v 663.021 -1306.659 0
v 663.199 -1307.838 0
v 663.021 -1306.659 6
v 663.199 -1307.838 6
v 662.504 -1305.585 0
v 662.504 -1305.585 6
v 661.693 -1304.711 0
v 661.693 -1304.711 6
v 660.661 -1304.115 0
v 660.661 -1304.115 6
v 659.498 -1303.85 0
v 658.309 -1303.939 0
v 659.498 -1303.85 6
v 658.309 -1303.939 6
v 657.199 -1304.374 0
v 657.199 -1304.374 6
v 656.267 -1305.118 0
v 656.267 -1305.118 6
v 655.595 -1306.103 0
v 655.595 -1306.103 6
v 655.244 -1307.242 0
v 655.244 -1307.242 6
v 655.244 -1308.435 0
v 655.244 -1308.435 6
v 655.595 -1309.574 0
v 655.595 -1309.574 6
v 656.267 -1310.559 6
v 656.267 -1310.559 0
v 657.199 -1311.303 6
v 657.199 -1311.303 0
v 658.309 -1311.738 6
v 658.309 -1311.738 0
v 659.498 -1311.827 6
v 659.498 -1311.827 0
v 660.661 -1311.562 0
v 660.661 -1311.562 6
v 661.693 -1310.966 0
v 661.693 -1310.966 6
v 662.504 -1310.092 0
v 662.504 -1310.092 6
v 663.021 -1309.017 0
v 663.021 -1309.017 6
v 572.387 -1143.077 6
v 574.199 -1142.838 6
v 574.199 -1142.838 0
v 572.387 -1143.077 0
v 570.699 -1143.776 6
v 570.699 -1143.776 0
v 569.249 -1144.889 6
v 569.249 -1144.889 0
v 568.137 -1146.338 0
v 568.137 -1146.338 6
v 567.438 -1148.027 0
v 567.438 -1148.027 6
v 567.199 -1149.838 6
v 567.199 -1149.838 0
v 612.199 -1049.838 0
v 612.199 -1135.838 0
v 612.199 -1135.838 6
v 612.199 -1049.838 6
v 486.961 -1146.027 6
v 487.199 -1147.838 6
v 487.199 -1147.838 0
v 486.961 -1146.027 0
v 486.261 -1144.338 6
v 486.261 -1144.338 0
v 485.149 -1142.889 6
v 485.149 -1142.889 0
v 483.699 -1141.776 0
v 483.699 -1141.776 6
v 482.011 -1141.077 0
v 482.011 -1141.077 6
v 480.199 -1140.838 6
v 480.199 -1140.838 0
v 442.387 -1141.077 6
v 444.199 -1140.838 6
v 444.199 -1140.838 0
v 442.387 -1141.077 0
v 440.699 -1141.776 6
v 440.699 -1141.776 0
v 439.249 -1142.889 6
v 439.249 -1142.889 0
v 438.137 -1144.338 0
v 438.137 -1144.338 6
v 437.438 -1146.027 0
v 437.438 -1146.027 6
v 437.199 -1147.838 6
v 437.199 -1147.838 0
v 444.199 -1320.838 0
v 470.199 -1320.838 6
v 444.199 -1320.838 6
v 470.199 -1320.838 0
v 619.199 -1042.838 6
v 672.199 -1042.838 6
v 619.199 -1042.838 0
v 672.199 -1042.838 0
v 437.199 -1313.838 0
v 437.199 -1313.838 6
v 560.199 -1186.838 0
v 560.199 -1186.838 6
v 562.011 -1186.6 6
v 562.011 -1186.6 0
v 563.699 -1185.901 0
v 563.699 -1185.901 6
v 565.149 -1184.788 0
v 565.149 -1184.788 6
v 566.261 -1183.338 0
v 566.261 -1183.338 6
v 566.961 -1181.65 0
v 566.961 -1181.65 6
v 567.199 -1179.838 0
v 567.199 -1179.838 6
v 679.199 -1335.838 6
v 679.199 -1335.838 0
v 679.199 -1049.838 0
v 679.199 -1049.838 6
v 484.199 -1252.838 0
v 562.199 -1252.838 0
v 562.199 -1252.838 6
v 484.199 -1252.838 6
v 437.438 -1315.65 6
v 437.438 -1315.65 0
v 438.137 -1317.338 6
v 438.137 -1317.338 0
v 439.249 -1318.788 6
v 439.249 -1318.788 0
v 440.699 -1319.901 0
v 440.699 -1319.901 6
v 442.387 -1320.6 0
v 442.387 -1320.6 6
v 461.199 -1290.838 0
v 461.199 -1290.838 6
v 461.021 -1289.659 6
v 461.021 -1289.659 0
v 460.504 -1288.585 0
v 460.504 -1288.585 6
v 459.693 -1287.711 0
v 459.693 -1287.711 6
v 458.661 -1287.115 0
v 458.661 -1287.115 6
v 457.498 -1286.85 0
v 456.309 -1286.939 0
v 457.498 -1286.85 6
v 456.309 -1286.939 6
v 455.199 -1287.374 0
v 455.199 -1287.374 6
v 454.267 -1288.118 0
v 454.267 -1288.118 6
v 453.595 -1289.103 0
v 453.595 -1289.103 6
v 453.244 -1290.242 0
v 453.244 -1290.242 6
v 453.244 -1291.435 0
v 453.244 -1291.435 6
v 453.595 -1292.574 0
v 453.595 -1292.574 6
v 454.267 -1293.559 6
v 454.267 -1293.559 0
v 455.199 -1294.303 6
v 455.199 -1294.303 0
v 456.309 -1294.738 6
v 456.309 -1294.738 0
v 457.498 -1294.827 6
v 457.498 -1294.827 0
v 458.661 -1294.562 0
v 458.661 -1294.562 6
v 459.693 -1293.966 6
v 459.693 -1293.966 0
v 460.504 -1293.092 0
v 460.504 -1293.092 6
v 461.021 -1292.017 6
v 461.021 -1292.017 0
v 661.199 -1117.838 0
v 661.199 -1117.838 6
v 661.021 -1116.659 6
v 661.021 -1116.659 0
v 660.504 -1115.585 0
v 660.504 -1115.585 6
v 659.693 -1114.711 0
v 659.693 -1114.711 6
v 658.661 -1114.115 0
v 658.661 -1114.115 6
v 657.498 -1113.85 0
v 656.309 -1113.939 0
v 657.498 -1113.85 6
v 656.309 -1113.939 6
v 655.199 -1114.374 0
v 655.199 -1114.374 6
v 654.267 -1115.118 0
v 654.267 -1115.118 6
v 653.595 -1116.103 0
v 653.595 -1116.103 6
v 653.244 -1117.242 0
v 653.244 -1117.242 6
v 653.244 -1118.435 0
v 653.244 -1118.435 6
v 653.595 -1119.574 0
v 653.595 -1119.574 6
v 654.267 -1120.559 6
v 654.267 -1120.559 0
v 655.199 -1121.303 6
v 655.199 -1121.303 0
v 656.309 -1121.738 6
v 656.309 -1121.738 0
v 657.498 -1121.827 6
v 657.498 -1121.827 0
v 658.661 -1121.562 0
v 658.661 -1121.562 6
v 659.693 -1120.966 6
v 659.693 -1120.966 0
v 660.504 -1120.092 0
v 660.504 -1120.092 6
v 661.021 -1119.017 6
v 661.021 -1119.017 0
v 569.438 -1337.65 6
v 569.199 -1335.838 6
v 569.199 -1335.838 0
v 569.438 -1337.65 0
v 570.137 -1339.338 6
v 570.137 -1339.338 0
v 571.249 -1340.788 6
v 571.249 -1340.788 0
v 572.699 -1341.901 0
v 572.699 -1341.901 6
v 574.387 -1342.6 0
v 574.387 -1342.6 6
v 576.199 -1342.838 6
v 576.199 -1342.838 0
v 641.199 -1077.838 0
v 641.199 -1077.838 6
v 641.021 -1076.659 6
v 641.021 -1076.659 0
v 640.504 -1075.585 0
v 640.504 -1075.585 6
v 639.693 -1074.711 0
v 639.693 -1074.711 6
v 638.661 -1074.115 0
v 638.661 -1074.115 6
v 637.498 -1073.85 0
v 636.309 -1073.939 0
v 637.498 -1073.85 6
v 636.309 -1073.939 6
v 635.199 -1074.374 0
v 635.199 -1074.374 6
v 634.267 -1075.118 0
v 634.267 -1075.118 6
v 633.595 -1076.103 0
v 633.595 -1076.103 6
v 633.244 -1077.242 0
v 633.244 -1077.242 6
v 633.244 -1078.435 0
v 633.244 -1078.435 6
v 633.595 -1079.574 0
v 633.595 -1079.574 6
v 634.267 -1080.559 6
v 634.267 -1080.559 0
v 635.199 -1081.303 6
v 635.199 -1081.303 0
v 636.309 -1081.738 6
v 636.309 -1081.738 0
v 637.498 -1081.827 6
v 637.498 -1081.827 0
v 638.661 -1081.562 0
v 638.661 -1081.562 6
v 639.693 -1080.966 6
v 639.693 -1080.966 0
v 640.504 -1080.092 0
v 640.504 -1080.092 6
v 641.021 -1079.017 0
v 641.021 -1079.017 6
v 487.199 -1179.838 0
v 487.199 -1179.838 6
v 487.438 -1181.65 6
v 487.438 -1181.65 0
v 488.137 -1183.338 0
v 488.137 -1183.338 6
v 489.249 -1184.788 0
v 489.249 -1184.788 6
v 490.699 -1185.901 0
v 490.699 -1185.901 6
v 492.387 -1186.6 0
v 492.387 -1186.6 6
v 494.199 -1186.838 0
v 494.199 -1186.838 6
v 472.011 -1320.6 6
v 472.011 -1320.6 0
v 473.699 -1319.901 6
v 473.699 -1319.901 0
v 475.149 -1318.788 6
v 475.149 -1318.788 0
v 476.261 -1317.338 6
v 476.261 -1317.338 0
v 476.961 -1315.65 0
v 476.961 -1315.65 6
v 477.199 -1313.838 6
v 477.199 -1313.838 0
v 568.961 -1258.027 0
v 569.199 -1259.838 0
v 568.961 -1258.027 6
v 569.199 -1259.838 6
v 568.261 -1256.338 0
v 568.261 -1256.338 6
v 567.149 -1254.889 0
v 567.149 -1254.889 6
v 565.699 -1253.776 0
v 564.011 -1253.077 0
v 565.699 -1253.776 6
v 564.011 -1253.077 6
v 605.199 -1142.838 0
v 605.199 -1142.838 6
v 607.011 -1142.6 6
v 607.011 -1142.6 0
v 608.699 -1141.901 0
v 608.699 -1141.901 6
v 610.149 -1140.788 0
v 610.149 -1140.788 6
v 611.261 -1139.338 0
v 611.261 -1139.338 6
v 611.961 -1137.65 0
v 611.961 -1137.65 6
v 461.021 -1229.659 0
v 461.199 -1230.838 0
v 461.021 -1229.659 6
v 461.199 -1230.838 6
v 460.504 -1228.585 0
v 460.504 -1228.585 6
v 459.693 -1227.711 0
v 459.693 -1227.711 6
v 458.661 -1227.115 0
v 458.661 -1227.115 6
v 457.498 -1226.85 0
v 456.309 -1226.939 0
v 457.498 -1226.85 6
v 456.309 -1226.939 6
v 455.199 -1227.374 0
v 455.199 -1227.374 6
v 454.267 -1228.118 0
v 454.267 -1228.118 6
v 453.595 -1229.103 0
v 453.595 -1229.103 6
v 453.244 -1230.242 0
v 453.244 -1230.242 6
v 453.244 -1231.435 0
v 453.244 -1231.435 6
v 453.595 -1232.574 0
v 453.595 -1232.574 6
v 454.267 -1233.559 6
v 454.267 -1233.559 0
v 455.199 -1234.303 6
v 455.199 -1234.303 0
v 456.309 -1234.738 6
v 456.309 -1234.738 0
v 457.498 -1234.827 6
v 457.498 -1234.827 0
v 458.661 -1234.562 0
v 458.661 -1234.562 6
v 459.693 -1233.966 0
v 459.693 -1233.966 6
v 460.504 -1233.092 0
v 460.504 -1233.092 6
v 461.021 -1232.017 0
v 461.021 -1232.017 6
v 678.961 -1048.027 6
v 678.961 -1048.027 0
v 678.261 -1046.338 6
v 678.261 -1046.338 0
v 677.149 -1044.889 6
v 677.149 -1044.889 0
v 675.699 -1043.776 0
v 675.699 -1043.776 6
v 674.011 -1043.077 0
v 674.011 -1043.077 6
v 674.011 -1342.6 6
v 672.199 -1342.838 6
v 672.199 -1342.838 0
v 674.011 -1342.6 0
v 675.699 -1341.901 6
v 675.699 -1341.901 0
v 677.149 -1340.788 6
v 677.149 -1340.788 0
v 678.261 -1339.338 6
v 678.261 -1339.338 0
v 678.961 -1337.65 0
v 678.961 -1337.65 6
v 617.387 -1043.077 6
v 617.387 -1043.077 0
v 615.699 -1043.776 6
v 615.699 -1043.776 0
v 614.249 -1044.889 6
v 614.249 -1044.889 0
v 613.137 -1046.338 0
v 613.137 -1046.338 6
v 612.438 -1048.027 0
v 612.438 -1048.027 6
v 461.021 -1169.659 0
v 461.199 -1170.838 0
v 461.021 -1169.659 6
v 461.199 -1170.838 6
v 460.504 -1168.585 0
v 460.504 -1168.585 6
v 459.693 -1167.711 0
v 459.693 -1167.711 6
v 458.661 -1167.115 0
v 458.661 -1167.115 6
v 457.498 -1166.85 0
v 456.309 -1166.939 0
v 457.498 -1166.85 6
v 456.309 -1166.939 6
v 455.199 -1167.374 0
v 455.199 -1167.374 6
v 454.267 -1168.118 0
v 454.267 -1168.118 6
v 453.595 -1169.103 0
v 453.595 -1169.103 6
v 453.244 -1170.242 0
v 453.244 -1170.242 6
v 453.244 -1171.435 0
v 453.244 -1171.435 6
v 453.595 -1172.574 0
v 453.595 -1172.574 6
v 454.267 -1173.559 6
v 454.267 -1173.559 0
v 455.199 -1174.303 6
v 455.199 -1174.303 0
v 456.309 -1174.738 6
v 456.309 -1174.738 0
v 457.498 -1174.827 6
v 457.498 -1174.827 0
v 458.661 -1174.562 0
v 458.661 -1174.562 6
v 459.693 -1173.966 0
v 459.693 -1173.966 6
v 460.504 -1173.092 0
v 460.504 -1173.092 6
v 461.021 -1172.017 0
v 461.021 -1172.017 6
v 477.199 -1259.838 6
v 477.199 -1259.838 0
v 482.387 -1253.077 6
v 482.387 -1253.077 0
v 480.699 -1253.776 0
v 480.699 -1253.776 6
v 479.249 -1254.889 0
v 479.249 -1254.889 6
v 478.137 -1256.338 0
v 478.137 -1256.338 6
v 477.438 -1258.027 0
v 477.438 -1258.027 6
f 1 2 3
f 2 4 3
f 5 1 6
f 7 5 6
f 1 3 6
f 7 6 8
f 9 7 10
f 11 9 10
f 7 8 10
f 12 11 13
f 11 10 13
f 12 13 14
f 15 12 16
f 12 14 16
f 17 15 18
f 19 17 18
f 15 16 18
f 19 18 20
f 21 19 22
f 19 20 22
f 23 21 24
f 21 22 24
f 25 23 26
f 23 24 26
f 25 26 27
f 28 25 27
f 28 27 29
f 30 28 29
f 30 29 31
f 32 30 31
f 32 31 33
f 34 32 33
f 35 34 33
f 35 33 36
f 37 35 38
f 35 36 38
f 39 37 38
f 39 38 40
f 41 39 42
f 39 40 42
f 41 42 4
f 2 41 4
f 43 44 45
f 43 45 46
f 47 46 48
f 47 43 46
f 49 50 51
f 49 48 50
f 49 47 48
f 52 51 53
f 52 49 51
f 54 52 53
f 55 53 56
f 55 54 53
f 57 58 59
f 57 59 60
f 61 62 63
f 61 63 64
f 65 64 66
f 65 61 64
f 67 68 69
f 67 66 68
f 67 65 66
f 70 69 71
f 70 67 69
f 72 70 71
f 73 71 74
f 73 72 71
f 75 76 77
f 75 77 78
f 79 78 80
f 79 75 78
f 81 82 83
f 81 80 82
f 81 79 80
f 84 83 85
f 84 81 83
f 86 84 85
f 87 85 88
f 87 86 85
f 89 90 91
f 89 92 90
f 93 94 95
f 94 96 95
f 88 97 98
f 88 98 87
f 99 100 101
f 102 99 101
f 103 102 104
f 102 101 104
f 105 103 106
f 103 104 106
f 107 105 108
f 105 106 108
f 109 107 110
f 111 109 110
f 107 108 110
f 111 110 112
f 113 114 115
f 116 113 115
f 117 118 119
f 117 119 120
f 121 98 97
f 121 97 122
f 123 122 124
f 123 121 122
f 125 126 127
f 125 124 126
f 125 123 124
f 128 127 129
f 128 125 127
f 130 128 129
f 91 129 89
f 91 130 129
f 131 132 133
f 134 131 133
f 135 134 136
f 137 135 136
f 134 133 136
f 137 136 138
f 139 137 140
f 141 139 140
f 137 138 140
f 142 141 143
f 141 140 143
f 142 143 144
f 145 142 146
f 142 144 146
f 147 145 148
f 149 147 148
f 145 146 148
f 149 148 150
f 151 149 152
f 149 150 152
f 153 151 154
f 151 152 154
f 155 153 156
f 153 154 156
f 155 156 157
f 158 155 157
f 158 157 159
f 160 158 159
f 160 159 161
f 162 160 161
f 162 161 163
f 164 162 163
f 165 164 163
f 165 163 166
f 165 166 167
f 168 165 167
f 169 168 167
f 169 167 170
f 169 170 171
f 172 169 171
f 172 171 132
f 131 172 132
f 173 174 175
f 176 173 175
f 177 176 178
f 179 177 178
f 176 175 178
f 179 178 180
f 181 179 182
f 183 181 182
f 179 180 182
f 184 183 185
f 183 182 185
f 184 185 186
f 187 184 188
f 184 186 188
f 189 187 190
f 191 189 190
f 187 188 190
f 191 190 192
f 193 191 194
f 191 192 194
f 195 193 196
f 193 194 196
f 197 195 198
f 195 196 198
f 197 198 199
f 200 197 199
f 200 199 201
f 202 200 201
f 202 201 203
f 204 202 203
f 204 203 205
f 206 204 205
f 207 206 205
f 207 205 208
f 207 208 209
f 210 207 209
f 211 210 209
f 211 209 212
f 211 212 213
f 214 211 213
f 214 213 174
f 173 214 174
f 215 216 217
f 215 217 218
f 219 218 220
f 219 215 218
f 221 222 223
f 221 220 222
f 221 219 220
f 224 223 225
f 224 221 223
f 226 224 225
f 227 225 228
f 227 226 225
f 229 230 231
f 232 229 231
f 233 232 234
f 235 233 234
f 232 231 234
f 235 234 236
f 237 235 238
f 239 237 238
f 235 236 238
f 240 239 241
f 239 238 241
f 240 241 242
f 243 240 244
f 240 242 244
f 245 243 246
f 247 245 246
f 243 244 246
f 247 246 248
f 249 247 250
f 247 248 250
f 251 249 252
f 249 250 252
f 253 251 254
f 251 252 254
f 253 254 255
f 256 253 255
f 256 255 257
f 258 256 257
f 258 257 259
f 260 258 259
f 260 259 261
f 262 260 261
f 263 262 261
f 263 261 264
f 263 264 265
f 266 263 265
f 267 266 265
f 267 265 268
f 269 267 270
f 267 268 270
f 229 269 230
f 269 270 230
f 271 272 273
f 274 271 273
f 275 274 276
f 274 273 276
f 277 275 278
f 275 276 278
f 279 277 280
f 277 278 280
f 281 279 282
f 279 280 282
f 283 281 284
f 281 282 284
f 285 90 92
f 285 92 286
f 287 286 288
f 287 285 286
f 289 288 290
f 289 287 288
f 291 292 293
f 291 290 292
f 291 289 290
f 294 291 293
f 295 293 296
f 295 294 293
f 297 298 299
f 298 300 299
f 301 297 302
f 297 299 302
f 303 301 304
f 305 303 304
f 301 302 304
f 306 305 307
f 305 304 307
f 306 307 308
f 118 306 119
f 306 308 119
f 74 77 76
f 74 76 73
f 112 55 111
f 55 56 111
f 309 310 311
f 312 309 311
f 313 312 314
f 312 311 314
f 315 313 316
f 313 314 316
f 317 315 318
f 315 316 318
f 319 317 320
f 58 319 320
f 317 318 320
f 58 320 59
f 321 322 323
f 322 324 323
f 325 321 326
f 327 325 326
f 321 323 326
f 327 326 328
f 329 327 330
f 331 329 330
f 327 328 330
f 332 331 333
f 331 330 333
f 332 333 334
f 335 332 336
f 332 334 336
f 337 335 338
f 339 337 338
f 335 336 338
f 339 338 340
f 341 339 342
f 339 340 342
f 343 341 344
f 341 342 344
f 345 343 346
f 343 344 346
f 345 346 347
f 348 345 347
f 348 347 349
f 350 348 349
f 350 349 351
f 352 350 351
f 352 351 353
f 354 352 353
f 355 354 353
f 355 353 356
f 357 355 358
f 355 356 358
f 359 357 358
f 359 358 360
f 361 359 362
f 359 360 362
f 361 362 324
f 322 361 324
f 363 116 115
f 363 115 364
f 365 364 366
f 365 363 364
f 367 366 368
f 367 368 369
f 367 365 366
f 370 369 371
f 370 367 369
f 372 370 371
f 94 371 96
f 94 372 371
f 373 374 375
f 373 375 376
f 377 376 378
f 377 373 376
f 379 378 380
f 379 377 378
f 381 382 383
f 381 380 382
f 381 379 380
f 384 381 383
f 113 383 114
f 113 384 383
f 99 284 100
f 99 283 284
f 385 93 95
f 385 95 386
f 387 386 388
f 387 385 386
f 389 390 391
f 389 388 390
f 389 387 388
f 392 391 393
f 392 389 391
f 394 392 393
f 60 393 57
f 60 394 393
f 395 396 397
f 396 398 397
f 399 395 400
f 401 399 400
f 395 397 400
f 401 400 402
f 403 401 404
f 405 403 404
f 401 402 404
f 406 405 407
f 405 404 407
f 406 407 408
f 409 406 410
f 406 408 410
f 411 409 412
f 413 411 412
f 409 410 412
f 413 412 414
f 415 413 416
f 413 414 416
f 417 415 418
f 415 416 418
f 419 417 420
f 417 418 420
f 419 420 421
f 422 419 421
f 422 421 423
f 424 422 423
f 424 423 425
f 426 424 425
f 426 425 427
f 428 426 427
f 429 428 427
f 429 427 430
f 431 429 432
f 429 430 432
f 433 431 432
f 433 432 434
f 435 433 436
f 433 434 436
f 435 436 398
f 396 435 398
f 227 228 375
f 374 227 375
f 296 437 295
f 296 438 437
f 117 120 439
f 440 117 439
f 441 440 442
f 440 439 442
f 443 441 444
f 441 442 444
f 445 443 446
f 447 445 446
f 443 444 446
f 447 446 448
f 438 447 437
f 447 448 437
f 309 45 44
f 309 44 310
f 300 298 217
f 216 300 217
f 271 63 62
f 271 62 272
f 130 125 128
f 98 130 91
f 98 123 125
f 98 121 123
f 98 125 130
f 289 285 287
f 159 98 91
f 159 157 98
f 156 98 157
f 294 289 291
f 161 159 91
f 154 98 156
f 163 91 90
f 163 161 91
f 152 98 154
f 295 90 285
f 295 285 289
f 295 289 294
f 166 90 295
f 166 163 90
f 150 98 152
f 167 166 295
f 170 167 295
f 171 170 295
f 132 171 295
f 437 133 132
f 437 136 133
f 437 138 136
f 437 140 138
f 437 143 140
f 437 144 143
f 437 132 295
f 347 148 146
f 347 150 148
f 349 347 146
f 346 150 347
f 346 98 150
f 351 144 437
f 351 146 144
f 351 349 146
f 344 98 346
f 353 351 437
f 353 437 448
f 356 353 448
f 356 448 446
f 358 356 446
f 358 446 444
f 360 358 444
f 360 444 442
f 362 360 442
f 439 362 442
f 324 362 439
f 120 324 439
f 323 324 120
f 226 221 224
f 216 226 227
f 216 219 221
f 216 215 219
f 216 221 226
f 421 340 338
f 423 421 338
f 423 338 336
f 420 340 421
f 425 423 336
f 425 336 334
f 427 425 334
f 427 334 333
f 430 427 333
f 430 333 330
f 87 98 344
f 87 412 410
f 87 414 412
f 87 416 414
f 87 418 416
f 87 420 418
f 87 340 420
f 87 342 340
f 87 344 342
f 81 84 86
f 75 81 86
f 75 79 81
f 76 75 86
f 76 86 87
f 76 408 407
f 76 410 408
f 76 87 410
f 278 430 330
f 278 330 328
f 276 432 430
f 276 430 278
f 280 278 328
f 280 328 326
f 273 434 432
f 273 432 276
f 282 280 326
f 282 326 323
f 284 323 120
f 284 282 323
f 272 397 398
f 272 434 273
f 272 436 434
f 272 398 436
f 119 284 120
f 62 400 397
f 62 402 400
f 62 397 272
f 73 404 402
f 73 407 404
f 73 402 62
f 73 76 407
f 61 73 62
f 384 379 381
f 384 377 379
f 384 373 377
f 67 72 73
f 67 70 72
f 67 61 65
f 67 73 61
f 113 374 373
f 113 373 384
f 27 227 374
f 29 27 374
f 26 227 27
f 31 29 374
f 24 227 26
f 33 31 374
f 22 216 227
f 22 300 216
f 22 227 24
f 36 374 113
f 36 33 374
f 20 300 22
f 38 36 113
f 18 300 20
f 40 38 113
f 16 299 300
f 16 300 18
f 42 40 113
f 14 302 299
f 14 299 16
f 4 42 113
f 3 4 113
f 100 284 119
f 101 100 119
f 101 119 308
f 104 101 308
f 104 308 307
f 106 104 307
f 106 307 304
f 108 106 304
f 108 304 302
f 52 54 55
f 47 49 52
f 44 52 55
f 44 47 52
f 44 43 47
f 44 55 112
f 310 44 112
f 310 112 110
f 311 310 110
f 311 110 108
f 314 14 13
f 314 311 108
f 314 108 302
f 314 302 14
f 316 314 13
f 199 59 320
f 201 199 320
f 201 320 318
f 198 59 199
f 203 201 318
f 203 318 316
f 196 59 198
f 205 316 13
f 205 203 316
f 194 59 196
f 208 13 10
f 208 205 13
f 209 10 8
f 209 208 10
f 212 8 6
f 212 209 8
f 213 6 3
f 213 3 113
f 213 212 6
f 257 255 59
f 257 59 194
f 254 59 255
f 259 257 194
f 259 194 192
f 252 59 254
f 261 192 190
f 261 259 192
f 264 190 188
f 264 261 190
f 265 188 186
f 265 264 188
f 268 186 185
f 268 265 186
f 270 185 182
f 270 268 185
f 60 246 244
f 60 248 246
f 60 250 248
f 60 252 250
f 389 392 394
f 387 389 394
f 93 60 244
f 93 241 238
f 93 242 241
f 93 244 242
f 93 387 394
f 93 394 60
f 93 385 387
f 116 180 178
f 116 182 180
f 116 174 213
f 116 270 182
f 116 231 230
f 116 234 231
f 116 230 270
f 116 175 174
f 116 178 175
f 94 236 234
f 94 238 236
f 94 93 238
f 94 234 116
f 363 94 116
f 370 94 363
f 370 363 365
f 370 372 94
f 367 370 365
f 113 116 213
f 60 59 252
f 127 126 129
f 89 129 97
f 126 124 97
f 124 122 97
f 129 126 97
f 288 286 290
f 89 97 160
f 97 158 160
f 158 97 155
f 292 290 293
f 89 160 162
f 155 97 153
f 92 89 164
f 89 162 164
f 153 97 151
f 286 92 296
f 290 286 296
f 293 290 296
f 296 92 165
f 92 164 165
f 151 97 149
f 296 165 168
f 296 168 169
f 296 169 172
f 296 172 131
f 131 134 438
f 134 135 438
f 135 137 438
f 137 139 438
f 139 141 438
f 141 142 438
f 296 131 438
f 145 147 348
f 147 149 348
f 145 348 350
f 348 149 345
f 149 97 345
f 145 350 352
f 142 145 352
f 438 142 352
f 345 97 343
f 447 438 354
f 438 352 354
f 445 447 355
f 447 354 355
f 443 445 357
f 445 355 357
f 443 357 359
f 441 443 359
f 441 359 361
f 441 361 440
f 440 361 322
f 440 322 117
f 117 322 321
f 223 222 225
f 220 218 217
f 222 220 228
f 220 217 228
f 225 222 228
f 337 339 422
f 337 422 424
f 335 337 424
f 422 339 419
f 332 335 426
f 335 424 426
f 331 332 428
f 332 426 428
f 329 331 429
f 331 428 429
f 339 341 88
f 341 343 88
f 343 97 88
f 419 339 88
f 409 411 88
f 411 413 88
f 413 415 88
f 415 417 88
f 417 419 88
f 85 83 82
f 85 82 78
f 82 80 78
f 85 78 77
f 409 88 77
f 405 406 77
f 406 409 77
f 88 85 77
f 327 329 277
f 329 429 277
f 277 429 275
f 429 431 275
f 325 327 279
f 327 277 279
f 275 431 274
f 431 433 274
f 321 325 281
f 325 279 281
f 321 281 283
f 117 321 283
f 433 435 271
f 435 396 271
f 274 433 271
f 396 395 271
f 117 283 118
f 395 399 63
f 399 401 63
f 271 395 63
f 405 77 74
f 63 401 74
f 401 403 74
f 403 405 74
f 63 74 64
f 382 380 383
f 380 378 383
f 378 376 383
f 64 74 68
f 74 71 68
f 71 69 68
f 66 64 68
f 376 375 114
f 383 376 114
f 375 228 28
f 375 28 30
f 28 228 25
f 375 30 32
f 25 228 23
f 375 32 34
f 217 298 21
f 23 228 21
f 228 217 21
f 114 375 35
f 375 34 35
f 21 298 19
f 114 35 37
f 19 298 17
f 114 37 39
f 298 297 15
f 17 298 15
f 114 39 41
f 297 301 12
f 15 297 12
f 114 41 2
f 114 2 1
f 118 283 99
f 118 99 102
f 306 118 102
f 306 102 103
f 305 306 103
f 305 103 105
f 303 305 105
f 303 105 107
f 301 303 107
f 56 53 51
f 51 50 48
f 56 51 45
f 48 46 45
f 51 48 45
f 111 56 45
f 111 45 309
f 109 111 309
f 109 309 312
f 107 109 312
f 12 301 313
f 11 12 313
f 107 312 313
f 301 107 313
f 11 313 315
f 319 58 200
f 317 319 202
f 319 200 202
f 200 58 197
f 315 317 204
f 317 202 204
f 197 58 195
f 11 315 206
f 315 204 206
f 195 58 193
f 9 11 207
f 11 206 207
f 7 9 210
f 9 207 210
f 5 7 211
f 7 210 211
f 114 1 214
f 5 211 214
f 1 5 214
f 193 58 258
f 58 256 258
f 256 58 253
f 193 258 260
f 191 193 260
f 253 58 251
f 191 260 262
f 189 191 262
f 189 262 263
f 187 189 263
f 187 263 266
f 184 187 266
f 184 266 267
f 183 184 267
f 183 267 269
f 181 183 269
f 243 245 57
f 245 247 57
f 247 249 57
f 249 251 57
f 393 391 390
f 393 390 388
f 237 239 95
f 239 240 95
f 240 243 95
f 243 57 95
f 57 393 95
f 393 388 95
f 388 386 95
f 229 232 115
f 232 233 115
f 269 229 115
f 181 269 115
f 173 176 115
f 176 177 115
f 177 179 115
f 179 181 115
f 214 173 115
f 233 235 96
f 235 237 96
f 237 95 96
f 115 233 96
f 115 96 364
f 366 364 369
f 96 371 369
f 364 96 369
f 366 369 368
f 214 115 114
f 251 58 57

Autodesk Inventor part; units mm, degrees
ref_plane "YZ Plane" through (0, 0, 0) normal (1, 0, 0) x (0, 1, 0)
ref_plane "XZ Plane" through (0, 0, 0) normal (0, 1, 0) x (-1, 0, 0)
ref_plane "XY Plane" through (0, 0, 0) normal (0, 0, 1) x (1, 0, 0)
ref_plane "Work Plane1" through (678.6266, 4, 0) normal (0, 0, 1) x (1, 0, 0)
sketch "Sketch1" plane through (678.6266, 4, 0) normal (0, 0, 1) x (1, 0, 0)
  line L0 (0.5726, -1046.8384) -> (-66.4274, -1046.8384)
  line L1 (-109.4274, -1346.8384) -> (0.5726, -1346.8384)
  line L2 (0.5726, -1346.8384) -> (0.5726, -1046.8384)
  line L3 (-109.4274, -1256.8384) -> (-201.4274, -1256.8384)
  line L4 (-201.4274, -1256.8384) -> (-201.4274, -1324.8384)
  line L5 (-201.4274, -1324.8384) -> (-241.4274, -1324.8384)
  line L6 (-241.4274, -1324.8384) -> (-241.4274, -1144.8384)
  line L7 (-191.4274, -1190.8384) -> (-111.4274, -1190.8384)
  line L8 (-111.4274, -1146.8384) -> (-111.4274, -1190.8384)
  line L9 (-109.4274, -1256.8384) -> (-109.4274, -1346.8384)
  line L10 (-241.4274, -1144.8384) -> (-191.4274, -1144.8384)
  line L11 (-191.4274, -1144.8384) -> (-191.4274, -1190.8384)
  line L12 (-111.4274, -1146.8384) -> (-66.4274, -1146.8384)
  line L13 (-66.4274, -1146.8384) -> (-66.4274, -1046.8384)
  point P0 (-678.6266, -4)
  dimension "d0" = 110
  dimension "d4" = 92
  dimension "d5" = 68
  dimension "d6" = 40
  dimension "d7" = 180
  dimension "d8" = 50
  dimension "d9" = 46
  dimension "d10" = 300
  dimension "d12" = 80
  dimension "d13" = 44
  dimension "d14" = 45
  dimension "d15" = 100
extrude "Extrusion1" add sketch "Sketch1" along normal blind 6
fillet "Fillet1" radius 7 14 edges at (487.1992, -1186.8384, 3) (567.1992, -1186.8384, 3) (612.1992, -1042.8384, 3) (679.1992, -1042.8384, 3) (487.1992, -1140.8384, 3) (437.1992, -1140.8384, 3) (437.1992, -1320.8384, 3) (477.1992, -1320.8384, 3) (477.1992, -1252.8384, 3) (569.1992, -1252.8384, 3) (569.1992, -1342.8384, 3) (679.1992, -1342.8384, 3) (567.1992, -1142.8384, 3) (612.1992, -1142.8384, 3)
sketch "Sketch2" plane through (678.6266, 4, 6) normal (0, 0, 1) x (1, 0, 0)
  circle A0 centre (-221.4274, -1294.8384) radius 4
  circle A1 centre (-221.4274, -1234.8384) radius 4
  circle A2 centre (-221.4274, -1174.8384) radius 4
  line L0 (-234.4274, -1324.8384) -> (-208.4274, -1324.8384) projected
  line L1 (-221.4274, -1324.8384) -> (-221.4274, -1294.8384) construction
  line L2 (-221.4274, -1294.8384) -> (-221.4274, -1234.8384) construction
  line L3 (-221.4274, -1234.8384) -> (-221.4274, -1174.8384) construction
  line L4 (-241.4274, -1151.8384) -> (-241.4274, -1317.8384) projected
  line L5 (-241.4274, -1234.8384) -> (-221.4274, -1234.8384) construction
  circle A3 centre (-19.4274, -1311.8384) radius 4
  circle A4 centre (-21.4274, -1121.8384) radius 4
  circle A5 centre (-41.4274, -1081.8384) radius 4
  line L6 (-102.4274, -1346.8384) -> (-6.4274, -1346.8384) projected
  line L7 (0.5726, -1339.8384) -> (0.5726, -1053.8384) projected
  line L8 (-6.4274, -1046.8384) -> (-59.4274, -1046.8384) projected
  line L9 (-66.4274, -1053.8384) -> (-66.4274, -1139.8384) projected
  point P0 (-678.6266, -4)
  dimension "d17" = 8
  dimension "d18" = 60
  dimension "d19" = 60
  dimension "d20" = 8
  dimension "d21" = 35
  dimension "d22" = 20
  dimension "d23" = 35
  dimension "d24" = 25
  dimension "d25" = 40
  dimension "d26" = 20
  dimension "d27" = 30
extrude "Extrusion2" cut sketch "Sketch2" against normal through all
